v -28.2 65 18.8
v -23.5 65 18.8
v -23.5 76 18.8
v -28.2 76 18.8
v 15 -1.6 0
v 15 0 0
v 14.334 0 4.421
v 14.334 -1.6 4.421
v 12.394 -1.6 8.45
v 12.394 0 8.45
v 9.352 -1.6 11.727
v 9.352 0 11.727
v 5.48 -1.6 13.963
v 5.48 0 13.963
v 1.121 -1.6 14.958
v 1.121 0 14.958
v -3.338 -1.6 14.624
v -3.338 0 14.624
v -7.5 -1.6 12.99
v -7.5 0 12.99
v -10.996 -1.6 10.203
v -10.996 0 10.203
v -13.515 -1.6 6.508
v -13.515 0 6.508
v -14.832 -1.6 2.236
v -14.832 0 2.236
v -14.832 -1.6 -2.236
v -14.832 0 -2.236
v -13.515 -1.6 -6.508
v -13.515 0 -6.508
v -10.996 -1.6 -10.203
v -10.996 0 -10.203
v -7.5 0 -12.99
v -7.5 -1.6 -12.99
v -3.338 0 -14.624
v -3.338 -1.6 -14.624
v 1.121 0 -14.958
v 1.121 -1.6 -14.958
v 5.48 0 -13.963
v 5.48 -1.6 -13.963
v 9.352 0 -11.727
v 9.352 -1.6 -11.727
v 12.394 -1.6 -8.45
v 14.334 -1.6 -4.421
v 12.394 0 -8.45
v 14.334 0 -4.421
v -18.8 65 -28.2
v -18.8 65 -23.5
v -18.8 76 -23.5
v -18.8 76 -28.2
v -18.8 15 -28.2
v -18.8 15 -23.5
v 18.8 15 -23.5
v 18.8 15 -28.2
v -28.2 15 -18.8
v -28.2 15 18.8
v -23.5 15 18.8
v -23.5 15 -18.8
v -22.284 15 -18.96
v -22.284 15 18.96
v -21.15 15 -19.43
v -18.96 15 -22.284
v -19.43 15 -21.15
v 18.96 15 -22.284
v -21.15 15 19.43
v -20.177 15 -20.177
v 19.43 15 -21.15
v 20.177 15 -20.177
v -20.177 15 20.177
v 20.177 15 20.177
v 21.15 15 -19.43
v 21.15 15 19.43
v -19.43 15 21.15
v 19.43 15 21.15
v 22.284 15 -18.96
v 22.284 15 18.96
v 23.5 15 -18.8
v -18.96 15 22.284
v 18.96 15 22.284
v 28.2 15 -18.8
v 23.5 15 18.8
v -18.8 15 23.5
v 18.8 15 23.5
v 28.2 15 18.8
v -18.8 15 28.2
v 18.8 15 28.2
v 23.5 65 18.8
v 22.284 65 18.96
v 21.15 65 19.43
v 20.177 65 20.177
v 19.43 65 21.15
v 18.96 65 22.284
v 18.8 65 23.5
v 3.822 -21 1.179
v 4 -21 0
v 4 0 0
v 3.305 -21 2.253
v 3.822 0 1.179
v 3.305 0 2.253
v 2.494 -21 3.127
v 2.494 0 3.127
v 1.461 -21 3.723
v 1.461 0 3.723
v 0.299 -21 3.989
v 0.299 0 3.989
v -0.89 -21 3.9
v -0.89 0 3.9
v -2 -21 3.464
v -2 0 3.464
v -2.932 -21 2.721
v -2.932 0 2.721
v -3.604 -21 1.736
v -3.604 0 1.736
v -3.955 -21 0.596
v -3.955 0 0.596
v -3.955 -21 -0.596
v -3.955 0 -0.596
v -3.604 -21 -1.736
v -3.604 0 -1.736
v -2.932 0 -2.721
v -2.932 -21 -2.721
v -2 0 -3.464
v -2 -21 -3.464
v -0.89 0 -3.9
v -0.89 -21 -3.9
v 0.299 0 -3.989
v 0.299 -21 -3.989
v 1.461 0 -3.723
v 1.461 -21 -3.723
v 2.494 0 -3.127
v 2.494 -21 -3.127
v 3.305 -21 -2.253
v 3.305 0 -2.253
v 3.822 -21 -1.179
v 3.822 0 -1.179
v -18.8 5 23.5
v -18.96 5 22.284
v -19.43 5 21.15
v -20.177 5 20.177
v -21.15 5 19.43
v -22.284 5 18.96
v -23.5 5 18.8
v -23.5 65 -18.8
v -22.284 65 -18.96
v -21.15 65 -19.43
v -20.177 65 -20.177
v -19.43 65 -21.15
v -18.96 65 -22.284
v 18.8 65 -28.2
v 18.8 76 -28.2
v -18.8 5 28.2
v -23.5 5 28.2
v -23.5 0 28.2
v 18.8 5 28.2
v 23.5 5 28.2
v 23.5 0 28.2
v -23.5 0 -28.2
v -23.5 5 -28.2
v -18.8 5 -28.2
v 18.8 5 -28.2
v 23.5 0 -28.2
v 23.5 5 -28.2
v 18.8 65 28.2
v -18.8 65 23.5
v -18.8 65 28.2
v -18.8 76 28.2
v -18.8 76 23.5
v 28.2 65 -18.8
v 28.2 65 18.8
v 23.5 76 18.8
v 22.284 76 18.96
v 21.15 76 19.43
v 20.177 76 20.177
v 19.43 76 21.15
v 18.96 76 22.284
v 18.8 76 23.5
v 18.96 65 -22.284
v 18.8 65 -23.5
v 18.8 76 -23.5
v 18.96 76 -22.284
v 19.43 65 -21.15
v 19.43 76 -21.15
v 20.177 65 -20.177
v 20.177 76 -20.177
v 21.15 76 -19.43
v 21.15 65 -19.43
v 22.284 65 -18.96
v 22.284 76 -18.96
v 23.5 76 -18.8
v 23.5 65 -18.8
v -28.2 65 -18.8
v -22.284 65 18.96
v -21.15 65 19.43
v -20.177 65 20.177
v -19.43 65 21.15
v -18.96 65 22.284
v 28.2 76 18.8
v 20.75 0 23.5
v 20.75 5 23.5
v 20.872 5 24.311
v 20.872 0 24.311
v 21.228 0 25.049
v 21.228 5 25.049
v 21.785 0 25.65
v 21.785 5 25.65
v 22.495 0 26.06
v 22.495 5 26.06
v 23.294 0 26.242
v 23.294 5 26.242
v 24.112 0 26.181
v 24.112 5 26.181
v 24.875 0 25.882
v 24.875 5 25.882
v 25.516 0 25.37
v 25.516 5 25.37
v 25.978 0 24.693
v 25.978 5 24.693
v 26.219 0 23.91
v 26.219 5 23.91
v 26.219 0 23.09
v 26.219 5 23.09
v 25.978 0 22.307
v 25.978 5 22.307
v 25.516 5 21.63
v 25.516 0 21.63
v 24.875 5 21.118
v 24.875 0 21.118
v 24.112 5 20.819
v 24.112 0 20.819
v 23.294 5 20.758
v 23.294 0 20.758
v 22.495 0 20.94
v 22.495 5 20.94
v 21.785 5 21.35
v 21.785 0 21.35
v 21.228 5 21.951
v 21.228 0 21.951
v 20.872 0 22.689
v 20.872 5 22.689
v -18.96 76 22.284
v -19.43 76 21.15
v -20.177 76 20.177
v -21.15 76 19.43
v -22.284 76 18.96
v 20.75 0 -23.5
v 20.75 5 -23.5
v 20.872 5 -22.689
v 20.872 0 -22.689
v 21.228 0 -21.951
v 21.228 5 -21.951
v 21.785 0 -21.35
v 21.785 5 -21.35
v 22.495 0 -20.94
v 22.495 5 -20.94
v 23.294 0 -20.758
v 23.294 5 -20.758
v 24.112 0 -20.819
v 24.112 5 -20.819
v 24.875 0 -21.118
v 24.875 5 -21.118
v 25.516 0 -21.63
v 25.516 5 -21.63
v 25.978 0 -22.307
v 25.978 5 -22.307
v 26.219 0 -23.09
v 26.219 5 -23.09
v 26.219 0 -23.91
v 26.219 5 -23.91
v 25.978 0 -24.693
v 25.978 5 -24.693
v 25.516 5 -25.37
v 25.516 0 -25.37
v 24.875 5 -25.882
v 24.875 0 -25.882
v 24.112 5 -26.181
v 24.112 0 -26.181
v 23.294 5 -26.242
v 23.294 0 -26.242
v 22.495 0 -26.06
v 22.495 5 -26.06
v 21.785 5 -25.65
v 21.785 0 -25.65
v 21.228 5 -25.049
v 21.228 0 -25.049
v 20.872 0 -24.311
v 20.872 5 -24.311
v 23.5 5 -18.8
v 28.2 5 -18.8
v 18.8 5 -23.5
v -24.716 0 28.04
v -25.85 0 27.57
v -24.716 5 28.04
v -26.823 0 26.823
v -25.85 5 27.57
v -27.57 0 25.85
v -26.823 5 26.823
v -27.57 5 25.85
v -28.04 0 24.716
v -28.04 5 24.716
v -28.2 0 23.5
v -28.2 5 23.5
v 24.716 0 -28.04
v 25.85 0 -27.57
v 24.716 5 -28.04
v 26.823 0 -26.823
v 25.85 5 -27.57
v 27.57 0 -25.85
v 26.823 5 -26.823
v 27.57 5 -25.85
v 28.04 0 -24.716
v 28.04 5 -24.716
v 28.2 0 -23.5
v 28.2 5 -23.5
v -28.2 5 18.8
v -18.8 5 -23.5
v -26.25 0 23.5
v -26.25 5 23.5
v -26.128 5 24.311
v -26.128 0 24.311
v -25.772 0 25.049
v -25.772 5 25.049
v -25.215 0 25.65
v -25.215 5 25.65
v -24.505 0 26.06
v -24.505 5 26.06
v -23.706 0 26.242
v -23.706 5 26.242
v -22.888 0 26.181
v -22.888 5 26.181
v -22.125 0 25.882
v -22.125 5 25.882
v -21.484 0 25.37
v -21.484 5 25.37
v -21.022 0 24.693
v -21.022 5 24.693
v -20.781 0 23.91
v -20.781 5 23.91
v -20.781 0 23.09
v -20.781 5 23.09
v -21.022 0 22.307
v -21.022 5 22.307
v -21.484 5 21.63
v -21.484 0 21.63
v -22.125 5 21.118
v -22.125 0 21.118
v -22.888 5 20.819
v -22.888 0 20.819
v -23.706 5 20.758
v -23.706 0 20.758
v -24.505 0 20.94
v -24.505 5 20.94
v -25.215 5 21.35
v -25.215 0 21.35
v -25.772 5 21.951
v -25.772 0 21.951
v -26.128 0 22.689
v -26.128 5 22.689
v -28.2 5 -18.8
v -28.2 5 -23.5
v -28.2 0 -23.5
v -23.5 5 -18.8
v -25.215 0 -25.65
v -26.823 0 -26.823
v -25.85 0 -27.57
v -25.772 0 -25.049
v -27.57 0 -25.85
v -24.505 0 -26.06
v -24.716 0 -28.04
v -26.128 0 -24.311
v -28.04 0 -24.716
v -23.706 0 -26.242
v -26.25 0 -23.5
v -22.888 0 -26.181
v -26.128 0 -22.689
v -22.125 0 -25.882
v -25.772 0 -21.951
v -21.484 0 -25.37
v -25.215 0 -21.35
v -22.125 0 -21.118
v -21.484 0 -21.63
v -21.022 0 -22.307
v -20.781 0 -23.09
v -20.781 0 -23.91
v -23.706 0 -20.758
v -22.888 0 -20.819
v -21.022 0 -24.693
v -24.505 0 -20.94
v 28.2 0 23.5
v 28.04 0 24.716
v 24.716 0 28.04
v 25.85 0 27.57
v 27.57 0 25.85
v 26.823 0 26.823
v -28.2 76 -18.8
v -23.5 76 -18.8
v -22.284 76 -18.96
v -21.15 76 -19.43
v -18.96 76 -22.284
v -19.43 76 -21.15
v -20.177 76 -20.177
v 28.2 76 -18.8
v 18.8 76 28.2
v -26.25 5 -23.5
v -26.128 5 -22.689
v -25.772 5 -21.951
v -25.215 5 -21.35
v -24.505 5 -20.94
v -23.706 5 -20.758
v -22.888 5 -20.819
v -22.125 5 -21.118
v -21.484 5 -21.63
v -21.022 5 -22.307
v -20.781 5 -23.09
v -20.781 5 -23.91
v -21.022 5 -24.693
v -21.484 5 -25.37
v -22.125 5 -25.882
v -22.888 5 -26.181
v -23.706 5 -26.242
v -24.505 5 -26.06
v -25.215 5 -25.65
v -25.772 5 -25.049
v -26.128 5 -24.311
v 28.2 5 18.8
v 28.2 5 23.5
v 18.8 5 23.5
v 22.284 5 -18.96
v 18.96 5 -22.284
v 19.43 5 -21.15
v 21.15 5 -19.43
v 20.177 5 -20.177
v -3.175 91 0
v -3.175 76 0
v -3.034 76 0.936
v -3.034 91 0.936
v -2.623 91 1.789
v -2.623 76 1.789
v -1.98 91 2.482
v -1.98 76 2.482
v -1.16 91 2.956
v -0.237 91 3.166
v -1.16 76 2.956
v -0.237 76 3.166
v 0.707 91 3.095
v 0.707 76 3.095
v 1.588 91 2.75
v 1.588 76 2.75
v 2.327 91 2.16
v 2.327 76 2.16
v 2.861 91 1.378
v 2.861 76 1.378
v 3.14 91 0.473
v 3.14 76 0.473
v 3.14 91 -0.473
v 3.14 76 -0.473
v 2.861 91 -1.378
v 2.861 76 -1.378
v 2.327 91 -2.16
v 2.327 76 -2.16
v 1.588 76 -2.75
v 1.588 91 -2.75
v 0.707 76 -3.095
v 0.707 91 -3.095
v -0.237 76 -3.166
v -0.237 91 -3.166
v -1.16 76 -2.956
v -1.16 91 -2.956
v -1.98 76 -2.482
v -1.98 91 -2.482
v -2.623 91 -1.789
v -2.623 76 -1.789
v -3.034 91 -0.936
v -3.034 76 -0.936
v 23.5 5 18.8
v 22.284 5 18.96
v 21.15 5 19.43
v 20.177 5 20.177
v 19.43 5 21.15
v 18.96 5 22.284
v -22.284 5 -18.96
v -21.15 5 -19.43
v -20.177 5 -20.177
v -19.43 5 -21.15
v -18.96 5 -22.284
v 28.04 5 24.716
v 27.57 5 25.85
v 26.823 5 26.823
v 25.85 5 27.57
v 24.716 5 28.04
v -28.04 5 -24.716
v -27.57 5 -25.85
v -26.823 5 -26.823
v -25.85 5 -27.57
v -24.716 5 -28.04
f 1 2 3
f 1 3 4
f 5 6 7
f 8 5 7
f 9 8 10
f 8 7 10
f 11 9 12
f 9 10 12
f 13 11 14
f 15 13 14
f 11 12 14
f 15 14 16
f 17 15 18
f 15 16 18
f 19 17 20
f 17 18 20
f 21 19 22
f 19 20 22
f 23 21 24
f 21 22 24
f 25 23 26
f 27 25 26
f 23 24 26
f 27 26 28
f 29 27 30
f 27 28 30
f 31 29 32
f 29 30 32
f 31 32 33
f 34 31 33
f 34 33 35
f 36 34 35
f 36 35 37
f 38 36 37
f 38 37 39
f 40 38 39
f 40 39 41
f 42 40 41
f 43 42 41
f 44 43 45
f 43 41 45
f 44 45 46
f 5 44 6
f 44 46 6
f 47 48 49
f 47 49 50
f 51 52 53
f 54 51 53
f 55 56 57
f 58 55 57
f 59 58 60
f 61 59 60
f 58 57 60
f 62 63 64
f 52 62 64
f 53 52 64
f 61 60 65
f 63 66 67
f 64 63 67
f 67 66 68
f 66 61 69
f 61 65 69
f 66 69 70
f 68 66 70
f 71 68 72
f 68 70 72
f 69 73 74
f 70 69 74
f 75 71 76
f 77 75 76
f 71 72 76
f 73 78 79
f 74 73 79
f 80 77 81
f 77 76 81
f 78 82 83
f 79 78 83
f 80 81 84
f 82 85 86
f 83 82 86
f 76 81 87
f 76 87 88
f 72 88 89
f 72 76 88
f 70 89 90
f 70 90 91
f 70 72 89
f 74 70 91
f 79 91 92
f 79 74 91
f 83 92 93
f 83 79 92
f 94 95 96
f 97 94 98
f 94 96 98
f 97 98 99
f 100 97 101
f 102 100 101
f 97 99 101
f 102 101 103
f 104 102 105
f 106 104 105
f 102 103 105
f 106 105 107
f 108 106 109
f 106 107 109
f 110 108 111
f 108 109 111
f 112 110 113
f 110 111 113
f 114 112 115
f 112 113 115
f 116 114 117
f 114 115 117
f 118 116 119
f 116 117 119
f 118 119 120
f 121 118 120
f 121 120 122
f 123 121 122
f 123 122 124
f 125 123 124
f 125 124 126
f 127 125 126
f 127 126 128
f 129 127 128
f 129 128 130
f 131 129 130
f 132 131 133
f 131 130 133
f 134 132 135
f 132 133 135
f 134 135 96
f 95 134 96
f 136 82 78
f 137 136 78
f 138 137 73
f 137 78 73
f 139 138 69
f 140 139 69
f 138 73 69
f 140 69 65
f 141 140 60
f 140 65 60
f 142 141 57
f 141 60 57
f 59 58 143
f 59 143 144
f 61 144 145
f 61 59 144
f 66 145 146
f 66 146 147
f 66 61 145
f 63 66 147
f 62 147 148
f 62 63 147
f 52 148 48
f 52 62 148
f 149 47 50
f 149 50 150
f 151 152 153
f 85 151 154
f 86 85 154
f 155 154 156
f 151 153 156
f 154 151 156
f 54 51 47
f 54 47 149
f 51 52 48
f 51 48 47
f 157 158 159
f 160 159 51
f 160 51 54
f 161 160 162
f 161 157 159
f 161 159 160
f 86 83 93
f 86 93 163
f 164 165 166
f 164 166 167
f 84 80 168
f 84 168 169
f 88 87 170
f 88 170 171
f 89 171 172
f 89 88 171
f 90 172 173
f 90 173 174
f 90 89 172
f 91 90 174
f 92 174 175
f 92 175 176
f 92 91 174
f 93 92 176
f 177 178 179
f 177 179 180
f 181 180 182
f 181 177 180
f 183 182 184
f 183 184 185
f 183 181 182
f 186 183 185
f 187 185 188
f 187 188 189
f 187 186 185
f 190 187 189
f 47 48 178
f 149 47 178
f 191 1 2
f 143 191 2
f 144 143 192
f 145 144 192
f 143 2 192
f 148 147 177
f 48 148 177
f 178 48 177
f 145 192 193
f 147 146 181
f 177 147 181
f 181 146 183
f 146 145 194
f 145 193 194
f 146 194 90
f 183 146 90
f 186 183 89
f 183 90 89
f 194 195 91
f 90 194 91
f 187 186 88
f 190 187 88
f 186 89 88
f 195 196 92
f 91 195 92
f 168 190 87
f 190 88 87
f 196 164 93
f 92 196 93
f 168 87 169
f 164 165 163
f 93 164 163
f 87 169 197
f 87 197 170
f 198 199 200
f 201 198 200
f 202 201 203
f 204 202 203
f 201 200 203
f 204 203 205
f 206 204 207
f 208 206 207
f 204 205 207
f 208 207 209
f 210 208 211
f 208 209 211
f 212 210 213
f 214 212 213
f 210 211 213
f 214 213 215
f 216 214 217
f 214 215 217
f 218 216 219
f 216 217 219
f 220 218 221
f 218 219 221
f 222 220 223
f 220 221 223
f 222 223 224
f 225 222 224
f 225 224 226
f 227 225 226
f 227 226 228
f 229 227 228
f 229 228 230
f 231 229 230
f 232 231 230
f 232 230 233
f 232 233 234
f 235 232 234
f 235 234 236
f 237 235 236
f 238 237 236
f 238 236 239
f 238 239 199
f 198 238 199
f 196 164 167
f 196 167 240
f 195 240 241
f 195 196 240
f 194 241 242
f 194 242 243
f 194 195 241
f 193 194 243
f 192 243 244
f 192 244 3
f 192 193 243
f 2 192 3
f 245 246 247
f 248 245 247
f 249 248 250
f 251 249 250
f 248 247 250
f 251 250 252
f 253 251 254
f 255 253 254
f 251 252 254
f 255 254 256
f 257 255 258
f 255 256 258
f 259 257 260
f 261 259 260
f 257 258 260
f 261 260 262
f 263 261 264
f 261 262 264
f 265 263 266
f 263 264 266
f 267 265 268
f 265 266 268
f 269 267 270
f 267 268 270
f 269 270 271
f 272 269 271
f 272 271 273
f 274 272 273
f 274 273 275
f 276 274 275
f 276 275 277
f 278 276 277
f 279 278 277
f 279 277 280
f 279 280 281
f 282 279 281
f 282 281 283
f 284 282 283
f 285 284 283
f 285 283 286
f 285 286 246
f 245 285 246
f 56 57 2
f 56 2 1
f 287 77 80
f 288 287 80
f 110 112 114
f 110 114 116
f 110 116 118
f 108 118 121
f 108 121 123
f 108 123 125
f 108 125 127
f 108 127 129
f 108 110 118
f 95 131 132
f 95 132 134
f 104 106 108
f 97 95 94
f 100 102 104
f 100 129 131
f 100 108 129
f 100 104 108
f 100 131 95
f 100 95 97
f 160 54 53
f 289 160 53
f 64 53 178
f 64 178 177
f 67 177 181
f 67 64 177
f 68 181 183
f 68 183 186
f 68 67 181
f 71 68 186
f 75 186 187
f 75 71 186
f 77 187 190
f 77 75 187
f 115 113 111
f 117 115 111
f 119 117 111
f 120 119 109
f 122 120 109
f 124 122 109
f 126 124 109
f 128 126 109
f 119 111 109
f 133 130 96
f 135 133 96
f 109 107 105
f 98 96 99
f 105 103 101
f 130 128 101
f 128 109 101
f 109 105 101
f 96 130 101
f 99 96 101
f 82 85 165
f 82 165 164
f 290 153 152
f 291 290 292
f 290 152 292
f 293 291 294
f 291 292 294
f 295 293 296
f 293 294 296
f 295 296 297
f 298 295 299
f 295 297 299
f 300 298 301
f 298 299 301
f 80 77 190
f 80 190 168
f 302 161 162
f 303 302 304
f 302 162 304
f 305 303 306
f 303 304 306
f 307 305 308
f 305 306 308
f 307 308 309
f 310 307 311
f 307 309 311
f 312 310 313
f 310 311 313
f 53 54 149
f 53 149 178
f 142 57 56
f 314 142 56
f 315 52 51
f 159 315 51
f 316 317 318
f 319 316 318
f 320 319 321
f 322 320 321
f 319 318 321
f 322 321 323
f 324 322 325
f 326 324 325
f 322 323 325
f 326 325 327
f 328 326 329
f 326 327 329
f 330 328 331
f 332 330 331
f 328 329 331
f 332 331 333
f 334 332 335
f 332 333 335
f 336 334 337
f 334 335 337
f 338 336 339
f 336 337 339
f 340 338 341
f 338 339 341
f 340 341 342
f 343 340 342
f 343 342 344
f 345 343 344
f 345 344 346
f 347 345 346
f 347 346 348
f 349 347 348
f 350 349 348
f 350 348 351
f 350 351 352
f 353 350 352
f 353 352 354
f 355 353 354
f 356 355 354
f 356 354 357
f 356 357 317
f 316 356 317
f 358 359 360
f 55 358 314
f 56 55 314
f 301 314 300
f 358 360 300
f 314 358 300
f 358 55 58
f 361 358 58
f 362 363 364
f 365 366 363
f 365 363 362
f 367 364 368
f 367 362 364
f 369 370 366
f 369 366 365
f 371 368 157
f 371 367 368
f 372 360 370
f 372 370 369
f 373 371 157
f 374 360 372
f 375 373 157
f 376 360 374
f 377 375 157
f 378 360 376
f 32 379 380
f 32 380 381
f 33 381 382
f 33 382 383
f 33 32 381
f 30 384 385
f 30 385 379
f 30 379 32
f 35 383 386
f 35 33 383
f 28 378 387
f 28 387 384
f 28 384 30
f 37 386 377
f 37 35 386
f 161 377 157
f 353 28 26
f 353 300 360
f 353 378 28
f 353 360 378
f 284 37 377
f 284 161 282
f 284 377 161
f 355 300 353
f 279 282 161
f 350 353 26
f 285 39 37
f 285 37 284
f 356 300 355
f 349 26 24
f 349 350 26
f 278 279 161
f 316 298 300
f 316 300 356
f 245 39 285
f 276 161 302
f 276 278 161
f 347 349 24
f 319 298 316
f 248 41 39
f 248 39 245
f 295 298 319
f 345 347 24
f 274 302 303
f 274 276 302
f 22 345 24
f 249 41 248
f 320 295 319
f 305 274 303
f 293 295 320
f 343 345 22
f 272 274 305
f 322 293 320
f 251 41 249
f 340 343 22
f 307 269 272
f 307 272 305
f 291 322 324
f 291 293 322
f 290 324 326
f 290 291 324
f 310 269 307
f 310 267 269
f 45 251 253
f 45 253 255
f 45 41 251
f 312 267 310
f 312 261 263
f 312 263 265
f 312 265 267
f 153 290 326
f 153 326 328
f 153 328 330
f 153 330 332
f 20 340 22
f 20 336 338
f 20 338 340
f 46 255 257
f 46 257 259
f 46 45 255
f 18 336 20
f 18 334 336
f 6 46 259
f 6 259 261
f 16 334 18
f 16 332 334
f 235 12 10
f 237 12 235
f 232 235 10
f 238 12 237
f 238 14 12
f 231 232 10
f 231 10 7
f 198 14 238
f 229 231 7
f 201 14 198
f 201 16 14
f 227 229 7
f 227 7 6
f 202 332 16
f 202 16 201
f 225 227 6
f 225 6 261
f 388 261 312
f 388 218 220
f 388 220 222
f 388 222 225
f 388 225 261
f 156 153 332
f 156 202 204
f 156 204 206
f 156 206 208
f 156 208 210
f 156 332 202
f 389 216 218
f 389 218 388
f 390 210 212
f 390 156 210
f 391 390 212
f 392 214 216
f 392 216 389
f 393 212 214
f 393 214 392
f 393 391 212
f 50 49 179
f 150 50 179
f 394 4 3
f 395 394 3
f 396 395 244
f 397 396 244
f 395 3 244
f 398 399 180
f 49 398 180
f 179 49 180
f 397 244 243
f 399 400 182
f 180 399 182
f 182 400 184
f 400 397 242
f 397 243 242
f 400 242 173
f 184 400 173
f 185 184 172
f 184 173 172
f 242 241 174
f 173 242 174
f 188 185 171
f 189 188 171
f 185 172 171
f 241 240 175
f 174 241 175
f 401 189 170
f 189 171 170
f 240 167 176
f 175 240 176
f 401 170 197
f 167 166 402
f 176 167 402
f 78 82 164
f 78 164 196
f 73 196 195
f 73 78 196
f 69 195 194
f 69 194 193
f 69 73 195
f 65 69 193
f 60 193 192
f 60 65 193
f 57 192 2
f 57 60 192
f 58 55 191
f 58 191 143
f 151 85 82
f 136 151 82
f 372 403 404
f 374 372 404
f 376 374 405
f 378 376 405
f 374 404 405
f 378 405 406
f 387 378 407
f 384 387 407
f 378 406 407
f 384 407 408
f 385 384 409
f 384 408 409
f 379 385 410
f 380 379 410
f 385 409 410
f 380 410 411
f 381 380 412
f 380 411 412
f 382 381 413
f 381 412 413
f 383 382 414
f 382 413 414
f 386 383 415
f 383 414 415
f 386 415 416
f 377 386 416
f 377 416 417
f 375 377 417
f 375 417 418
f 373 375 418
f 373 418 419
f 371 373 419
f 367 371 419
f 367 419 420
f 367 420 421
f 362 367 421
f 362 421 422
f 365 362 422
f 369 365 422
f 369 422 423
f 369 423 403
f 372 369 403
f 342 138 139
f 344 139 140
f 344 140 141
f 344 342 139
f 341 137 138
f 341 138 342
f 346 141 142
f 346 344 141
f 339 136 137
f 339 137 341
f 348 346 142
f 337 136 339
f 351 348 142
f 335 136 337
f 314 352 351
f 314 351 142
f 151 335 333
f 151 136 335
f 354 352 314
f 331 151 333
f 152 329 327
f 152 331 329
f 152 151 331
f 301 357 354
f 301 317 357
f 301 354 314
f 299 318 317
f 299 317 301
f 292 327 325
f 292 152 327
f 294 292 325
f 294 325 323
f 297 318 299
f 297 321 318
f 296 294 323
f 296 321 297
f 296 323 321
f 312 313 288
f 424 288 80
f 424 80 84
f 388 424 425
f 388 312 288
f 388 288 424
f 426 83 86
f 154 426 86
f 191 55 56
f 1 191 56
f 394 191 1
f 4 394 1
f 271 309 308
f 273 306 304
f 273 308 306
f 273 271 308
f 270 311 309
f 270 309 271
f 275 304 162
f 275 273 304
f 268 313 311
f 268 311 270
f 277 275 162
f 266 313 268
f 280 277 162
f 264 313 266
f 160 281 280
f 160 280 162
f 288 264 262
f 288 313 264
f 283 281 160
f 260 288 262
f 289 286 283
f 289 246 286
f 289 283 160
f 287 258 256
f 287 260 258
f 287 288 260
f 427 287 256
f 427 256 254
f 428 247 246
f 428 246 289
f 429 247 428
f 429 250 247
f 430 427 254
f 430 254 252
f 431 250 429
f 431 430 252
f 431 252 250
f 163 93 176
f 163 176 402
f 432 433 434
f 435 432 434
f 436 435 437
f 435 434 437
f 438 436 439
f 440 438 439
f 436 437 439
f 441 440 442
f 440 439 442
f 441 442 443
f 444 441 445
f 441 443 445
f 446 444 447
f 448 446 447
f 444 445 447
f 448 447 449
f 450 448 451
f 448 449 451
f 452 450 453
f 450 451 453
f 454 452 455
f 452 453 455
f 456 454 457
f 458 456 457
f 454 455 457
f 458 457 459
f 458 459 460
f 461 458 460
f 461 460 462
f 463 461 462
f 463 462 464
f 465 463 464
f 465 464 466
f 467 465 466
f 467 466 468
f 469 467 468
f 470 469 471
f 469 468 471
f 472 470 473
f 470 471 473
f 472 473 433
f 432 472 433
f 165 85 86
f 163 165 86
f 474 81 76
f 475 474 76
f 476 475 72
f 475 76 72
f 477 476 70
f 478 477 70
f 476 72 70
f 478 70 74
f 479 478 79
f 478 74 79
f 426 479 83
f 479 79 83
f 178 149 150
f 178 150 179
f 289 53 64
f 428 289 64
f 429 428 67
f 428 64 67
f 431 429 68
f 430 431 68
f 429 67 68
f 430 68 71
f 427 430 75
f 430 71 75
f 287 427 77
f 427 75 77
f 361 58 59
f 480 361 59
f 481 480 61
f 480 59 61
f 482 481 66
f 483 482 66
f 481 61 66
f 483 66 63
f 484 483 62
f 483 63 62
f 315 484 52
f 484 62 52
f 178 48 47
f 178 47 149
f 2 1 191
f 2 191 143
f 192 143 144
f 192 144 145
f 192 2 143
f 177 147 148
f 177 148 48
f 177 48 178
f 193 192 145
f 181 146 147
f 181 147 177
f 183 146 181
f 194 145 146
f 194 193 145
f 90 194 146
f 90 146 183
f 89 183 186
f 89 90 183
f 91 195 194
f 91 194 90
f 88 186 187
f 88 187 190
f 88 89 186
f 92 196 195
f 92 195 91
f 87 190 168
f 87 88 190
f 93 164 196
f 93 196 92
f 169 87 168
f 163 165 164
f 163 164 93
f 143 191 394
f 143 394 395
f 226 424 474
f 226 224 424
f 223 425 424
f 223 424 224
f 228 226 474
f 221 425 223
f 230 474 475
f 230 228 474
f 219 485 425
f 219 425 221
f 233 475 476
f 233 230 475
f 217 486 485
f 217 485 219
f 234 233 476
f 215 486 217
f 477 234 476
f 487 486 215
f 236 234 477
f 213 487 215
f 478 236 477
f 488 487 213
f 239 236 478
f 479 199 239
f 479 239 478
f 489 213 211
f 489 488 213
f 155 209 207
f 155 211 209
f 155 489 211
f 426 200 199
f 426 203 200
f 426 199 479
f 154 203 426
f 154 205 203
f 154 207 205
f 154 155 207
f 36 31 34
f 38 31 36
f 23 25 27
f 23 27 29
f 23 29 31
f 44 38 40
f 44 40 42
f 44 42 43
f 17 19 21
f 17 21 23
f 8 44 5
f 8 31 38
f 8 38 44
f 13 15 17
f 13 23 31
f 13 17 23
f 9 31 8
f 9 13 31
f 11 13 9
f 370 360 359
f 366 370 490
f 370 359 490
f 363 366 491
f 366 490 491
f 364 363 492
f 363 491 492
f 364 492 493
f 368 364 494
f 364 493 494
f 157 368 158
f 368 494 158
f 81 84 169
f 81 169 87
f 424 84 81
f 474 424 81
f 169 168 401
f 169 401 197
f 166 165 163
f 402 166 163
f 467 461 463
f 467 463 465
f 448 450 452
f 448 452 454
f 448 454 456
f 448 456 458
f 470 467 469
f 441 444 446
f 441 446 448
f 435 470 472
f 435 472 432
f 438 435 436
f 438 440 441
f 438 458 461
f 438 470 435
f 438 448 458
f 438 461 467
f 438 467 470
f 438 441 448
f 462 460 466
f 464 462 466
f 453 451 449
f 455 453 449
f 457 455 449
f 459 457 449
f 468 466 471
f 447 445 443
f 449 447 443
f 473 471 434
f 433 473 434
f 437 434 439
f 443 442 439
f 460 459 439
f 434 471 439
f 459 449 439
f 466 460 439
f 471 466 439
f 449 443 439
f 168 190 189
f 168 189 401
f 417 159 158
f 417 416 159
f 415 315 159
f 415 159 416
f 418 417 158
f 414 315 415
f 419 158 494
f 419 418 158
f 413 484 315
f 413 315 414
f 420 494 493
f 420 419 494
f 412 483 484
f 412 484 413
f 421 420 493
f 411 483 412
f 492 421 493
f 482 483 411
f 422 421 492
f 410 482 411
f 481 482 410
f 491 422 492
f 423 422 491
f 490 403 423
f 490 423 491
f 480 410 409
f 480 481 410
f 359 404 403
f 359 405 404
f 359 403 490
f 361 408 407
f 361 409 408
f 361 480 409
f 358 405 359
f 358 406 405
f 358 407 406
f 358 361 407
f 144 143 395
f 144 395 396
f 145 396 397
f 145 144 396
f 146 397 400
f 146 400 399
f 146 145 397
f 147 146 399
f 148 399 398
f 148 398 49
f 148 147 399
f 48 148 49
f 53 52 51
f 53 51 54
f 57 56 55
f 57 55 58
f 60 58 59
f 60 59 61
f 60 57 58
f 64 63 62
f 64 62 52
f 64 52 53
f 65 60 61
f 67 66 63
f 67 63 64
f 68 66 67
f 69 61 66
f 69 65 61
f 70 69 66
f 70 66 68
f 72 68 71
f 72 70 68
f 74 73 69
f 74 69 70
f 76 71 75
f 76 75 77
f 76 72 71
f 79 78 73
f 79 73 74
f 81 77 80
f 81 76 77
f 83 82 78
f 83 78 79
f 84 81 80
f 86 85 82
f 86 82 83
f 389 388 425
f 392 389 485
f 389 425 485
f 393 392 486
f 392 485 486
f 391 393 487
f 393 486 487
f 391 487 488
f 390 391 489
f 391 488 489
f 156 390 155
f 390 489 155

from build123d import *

# Parameters (mm, degrees)
F0_W      = 56.4
F0_H      = 56.4
F1_DEPTH  = 15
F3_D      = 5.5
F5_DEPTH  = 10
F7_DEPTH  = 5.001
F8_DEPTH  = 50
F9_DEPTH  = 11
F10_R     = 15
F11_DEPTH = 1.6
F12_R     = 4
F13_DEPTH = 21
F14_R     = 3.175
F15_DEPTH = 15


with BuildPart() as f1:
    # F0 (on Front) → F1 (new body)
    with BuildSketch(Plane.XZ):
        Rectangle(F0_W, F0_H)
    extrude(amount=-F1_DEPTH)

    # F3 (through all)
    with Locations(Plane.XZ):
        with Locations((-23.5, -23.5), (-23.5, 23.5), (23.5, 23.5), (23.5, -23.5)):
            Hole(F3_D / 2)

    # F4 (on face) → F5 (cut)
    with BuildSketch(Plane(origin=(0, 15, 0), x_dir=(-1, 0, 0), z_dir=(0, 1, 0))):
        with BuildLine():
            Line((28.2, 18.8), (28.2, 28.2))
            Line((28.2, 28.2), (18.8, 28.2))
            Line((18.8, 28.2), (18.8, 23.5))
            ThreePointArc((18.8, 23.5), (20.1765981284, 20.1765981284), (23.5, 18.8))
            Line((23.5, 18.8), (28.2, 18.8))
        make_face()
        with BuildLine():
            Line((28.2, -28.2), (28.2, -18.8))
            Line((28.2, -18.8), (23.5, -18.8))
            ThreePointArc((23.5, -18.8), (20.1765981284, -20.1765981284), (18.8, -23.5))
            Line((18.8, -23.5), (18.8, -28.2))
            Line((18.8, -28.2), (28.2, -28.2))
        make_face()
        with BuildLine():
            Line((-18.8, 23.5), (-18.8, 28.2))
            Line((-18.8, 28.2), (-28.2, 28.2))
            Line((-28.2, 28.2), (-28.2, 18.8))
            Line((-28.2, 18.8), (-23.5, 18.8))
            ThreePointArc((-23.5, 18.8), (-20.1765981284, 20.1765981284), (-18.8, 23.5))
        make_face()
        with BuildLine():
            Line((-28.2, -18.8), (-28.2, -28.2))
            Line((-28.2, -28.2), (-18.8, -28.2))
            Line((-18.8, -28.2), (-18.8, -23.5))
            ThreePointArc((-18.8, -23.5), (-20.1765981284, -20.1765981284), (-23.5, -18.8))
            Line((-23.5, -18.8), (-28.2, -18.8))
        make_face()
    extrude(amount=-F5_DEPTH, mode=Mode.SUBTRACT)

    # F6 (on face) → F7 (cut, through all)
    with BuildSketch(Plane(origin=(0, 5, 0), x_dir=(-1, 0, 0), z_dir=(0, 1, 0))):
        with BuildLine():
            ThreePointArc((23.5, 28.2), (26.8234018716, 26.8234018716), (28.2, 23.5))
            Line((28.2, 23.5), (28.2, 28.2))
            Line((28.2, 28.2), (23.5, 28.2))
        make_face()
        with BuildLine():
            Line((23.5, -28.2), (28.2, -28.2))
            Line((28.2, -28.2), (28.2, -23.5))
            ThreePointArc((28.2, -23.5), (26.8234018716, -26.8234018716), (23.5, -28.2))
        make_face()
        with BuildLine():
            Line((-23.5, 28.2), (-28.2, 28.2))
            Line((-28.2, 28.2), (-28.2, 23.5))
            ThreePointArc((-28.2, 23.5), (-26.8234018716, 26.8234018716), (-23.5, 28.2))
        make_face()
        with BuildLine():
            Line((-28.2, -28.2), (-23.5, -28.2))
            ThreePointArc((-23.5, -28.2), (-26.8234018716, -26.8234018716), (-28.2, -23.5))
            Line((-28.2, -23.5), (-28.2, -28.2))
        make_face()
    extrude(amount=-F7_DEPTH, mode=Mode.SUBTRACT)


with BuildPart() as f8:
    # F8 (new): a face of the model
    f8_faces = [f1.part.faces().sort_by_distance(p)[0] for p in [
        (0, 15, 0),
    ]]
    extrude(f8_faces, amount=F8_DEPTH)


with BuildPart() as f9:
    # F9 (new): a face of the model
    f9_faces = [f8.part.faces().sort_by_distance(p)[0] for p in [
        (0, 65, 0),
    ]]
    extrude(f9_faces, amount=F9_DEPTH)


with BuildPart() as f1_1:
    add(f1.part)

    # F10 (on face) → F11 (join)
    with BuildSketch(Plane.XZ):
        Circle(F10_R)
    extrude(amount=F11_DEPTH)


with BuildPart() as f13:
    # F12 (on face) → F13 (new body)
    with BuildSketch(Plane.XZ):
        Circle(F12_R)
    extrude(amount=F13_DEPTH)


with BuildPart() as f15:
    # F14 (on face) → F15 (new body)
    with BuildSketch(Plane(origin=(0, 76, 0), x_dir=(-1, 0, 0), z_dir=(0, 1, 0))):
        Circle(F14_R)
    extrude(amount=F15_DEPTH)


solid = Compound([f8.part, f9.part, f1_1.part, f13.part, f15.part])
